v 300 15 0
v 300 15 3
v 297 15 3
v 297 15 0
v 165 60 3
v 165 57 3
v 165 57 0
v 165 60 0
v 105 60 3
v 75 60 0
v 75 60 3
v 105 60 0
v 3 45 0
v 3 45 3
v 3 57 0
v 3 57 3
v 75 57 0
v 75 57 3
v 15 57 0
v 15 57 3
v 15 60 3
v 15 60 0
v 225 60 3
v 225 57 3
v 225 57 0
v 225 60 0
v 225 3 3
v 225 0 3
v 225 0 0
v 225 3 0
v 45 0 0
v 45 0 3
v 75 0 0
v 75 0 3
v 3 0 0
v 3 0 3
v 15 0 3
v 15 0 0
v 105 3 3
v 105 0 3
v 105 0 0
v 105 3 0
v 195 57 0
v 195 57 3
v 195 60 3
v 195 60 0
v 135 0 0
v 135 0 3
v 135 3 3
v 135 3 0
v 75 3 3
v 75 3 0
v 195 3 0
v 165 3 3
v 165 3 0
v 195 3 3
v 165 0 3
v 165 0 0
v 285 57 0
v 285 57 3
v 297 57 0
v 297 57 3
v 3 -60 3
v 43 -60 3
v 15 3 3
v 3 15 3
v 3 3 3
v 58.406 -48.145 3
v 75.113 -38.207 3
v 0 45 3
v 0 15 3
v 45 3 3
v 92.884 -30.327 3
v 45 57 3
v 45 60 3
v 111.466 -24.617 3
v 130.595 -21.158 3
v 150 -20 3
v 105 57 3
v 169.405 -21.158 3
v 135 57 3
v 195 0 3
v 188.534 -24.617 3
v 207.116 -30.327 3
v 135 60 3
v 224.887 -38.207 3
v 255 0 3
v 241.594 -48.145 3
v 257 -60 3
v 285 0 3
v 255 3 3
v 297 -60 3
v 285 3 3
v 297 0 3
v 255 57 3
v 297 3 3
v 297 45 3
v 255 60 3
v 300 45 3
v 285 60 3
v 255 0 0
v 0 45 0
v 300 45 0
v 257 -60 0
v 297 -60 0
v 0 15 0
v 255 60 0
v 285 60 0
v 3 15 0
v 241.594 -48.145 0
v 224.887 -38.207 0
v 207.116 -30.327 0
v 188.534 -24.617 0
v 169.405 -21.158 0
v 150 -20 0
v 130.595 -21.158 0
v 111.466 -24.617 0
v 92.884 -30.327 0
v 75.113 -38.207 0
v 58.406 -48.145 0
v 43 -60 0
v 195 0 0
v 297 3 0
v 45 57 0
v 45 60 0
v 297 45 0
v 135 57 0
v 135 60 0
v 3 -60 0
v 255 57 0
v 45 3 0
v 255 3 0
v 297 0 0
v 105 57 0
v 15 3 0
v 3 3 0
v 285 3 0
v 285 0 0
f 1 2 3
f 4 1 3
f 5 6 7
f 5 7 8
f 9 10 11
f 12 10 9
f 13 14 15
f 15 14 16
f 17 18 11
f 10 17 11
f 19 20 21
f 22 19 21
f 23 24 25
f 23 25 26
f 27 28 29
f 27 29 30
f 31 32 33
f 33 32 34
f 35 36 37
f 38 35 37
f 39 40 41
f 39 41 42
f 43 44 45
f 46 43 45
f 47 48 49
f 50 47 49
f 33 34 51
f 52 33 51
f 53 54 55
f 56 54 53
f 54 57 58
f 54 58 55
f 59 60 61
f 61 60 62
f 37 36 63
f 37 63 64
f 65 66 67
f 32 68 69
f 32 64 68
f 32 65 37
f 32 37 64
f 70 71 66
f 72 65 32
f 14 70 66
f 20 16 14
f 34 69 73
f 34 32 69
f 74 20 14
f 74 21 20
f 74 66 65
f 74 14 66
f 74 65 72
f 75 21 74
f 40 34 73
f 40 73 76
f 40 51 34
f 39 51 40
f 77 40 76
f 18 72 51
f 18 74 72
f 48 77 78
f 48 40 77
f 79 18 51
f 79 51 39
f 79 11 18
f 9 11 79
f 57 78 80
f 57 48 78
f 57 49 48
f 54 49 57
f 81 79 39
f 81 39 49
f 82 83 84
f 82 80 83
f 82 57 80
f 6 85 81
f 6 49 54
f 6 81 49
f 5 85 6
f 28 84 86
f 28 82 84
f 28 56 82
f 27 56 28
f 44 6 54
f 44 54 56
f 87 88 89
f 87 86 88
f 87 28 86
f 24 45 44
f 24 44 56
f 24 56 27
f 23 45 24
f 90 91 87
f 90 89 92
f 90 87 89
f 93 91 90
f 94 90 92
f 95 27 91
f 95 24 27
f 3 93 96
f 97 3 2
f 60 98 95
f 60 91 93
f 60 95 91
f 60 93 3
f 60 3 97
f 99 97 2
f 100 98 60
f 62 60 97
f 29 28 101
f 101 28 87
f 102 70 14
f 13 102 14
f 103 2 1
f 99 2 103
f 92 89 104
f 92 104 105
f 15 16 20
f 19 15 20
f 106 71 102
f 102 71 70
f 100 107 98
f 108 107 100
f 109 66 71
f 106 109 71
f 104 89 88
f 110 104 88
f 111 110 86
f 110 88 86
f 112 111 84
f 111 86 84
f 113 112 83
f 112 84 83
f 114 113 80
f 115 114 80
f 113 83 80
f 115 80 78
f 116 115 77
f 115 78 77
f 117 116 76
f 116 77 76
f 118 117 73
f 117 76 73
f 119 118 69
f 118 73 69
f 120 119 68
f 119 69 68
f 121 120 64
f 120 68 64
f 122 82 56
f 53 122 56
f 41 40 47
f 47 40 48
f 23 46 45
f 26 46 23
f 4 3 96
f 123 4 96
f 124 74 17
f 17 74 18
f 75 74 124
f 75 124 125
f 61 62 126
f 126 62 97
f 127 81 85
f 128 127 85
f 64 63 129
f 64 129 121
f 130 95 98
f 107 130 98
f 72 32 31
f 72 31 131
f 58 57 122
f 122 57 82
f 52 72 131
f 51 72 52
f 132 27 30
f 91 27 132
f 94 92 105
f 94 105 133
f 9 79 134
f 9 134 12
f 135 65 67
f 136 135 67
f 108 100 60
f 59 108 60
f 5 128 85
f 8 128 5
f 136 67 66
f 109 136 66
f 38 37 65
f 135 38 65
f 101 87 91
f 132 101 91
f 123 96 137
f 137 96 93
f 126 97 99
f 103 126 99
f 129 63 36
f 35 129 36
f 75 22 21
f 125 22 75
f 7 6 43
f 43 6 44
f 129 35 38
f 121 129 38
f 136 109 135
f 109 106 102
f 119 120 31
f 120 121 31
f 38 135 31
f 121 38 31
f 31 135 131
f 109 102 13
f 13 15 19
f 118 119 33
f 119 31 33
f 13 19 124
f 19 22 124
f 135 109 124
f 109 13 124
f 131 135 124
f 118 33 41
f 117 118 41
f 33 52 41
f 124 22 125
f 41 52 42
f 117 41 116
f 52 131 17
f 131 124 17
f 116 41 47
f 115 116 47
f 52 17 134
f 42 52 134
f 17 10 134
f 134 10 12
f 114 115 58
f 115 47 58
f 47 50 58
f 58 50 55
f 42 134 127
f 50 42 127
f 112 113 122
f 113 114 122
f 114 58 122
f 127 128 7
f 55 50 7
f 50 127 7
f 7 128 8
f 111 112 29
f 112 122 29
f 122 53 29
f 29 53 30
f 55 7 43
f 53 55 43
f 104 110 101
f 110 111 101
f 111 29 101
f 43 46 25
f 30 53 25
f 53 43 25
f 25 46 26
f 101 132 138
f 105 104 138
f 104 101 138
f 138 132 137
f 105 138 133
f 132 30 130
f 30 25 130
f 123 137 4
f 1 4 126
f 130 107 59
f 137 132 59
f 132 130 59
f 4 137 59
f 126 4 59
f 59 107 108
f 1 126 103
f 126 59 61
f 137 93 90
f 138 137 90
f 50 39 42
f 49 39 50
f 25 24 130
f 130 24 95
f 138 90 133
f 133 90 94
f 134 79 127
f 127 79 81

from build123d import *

# Parameters (mm, degrees)
SKETCH1_W           = 300
SKETCH1_H           = 60
BOSS_EXTRUDE1_DEPTH = 3
SKETCH3_W           = 300
SKETCH3_H           = 60
BOSS_EXTRUDE2_DEPTH = 3
SKETCH2_W           = 30
SKETCH2_H           = 3
CUT_EXTRUDE6_DEPTH  = 5
SKETCH4_W           = 3
SKETCH4_H           = 60
CUT_EXTRUDE7_DEPTH  = 5


with BuildPart() as part:
    # Sketch1 → Boss-Extrude1 (new body)
    with BuildSketch(Plane.XY):
        with Locations((150, 30)):
            Rectangle(SKETCH1_W, SKETCH1_H)
    extrude(amount=BOSS_EXTRUDE1_DEPTH)

    # Sketch3 → Boss-Extrude2 (add)
    with BuildSketch(Plane.XY.offset(3)):
        with Locations((150, -30)):
            Rectangle(SKETCH3_W, SKETCH3_H)
    extrude(amount=-BOSS_EXTRUDE2_DEPTH)

    # Sketch2 → Cut-Extrude6 (cut)
    with BuildSketch(Plane.XY.offset(3)):
        Polygon((15, 0), (15, 3), (3, 3), (3, 15), (0, 15), (0, 0), align=None)
        with Locations((60, 1.5)):
            Rectangle(SKETCH2_W, SKETCH2_H)
        with Locations((120, 1.5)):
            Rectangle(SKETCH2_W, SKETCH2_H)
        with Locations((180, 1.5)):
            Rectangle(SKETCH2_W, SKETCH2_H)
        with Locations((240, 1.5)):
            Rectangle(SKETCH2_W, SKETCH2_H)
        Polygon((300, 0), (300, 15), (297, 15), (297, 3), (285, 3), (285, 0), align=None)
        Polygon((300, 45), (300, 60), (285, 60), (285, 57), (297, 57), (297, 45), align=None)
        with Locations((240, 58.5)):
            Rectangle(SKETCH2_W, SKETCH2_H)
        with Locations((180, 58.5)):
            Rectangle(SKETCH2_W, SKETCH2_H)
        with Locations((120, 58.5)):
            Rectangle(SKETCH2_W, SKETCH2_H)
        with Locations((60, 58.5)):
            Rectangle(SKETCH2_W, SKETCH2_H)
        Polygon((0, 60), (0, 45), (3, 45), (3, 57), (15, 57), (15, 60), align=None)
    extrude(amount=-CUT_EXTRUDE6_DEPTH, mode=Mode.SUBTRACT)

    # Sketch4 → Cut-Extrude7 (cut)
    with BuildSketch(Plane.XY.offset(3)):
        with Locations((1.5, -30)):
            Rectangle(SKETCH4_W, SKETCH4_H)
        with Locations((298.5, -30)):
            Rectangle(SKETCH4_W, SKETCH4_H)
        with BuildLine():
            Line((43, -60), (257, -60))
            ThreePointArc((257, -60), (150, -20), (43, -60))
        make_face()
    extrude(amount=-CUT_EXTRUDE7_DEPTH, mode=Mode.SUBTRACT)


solid = part.part
